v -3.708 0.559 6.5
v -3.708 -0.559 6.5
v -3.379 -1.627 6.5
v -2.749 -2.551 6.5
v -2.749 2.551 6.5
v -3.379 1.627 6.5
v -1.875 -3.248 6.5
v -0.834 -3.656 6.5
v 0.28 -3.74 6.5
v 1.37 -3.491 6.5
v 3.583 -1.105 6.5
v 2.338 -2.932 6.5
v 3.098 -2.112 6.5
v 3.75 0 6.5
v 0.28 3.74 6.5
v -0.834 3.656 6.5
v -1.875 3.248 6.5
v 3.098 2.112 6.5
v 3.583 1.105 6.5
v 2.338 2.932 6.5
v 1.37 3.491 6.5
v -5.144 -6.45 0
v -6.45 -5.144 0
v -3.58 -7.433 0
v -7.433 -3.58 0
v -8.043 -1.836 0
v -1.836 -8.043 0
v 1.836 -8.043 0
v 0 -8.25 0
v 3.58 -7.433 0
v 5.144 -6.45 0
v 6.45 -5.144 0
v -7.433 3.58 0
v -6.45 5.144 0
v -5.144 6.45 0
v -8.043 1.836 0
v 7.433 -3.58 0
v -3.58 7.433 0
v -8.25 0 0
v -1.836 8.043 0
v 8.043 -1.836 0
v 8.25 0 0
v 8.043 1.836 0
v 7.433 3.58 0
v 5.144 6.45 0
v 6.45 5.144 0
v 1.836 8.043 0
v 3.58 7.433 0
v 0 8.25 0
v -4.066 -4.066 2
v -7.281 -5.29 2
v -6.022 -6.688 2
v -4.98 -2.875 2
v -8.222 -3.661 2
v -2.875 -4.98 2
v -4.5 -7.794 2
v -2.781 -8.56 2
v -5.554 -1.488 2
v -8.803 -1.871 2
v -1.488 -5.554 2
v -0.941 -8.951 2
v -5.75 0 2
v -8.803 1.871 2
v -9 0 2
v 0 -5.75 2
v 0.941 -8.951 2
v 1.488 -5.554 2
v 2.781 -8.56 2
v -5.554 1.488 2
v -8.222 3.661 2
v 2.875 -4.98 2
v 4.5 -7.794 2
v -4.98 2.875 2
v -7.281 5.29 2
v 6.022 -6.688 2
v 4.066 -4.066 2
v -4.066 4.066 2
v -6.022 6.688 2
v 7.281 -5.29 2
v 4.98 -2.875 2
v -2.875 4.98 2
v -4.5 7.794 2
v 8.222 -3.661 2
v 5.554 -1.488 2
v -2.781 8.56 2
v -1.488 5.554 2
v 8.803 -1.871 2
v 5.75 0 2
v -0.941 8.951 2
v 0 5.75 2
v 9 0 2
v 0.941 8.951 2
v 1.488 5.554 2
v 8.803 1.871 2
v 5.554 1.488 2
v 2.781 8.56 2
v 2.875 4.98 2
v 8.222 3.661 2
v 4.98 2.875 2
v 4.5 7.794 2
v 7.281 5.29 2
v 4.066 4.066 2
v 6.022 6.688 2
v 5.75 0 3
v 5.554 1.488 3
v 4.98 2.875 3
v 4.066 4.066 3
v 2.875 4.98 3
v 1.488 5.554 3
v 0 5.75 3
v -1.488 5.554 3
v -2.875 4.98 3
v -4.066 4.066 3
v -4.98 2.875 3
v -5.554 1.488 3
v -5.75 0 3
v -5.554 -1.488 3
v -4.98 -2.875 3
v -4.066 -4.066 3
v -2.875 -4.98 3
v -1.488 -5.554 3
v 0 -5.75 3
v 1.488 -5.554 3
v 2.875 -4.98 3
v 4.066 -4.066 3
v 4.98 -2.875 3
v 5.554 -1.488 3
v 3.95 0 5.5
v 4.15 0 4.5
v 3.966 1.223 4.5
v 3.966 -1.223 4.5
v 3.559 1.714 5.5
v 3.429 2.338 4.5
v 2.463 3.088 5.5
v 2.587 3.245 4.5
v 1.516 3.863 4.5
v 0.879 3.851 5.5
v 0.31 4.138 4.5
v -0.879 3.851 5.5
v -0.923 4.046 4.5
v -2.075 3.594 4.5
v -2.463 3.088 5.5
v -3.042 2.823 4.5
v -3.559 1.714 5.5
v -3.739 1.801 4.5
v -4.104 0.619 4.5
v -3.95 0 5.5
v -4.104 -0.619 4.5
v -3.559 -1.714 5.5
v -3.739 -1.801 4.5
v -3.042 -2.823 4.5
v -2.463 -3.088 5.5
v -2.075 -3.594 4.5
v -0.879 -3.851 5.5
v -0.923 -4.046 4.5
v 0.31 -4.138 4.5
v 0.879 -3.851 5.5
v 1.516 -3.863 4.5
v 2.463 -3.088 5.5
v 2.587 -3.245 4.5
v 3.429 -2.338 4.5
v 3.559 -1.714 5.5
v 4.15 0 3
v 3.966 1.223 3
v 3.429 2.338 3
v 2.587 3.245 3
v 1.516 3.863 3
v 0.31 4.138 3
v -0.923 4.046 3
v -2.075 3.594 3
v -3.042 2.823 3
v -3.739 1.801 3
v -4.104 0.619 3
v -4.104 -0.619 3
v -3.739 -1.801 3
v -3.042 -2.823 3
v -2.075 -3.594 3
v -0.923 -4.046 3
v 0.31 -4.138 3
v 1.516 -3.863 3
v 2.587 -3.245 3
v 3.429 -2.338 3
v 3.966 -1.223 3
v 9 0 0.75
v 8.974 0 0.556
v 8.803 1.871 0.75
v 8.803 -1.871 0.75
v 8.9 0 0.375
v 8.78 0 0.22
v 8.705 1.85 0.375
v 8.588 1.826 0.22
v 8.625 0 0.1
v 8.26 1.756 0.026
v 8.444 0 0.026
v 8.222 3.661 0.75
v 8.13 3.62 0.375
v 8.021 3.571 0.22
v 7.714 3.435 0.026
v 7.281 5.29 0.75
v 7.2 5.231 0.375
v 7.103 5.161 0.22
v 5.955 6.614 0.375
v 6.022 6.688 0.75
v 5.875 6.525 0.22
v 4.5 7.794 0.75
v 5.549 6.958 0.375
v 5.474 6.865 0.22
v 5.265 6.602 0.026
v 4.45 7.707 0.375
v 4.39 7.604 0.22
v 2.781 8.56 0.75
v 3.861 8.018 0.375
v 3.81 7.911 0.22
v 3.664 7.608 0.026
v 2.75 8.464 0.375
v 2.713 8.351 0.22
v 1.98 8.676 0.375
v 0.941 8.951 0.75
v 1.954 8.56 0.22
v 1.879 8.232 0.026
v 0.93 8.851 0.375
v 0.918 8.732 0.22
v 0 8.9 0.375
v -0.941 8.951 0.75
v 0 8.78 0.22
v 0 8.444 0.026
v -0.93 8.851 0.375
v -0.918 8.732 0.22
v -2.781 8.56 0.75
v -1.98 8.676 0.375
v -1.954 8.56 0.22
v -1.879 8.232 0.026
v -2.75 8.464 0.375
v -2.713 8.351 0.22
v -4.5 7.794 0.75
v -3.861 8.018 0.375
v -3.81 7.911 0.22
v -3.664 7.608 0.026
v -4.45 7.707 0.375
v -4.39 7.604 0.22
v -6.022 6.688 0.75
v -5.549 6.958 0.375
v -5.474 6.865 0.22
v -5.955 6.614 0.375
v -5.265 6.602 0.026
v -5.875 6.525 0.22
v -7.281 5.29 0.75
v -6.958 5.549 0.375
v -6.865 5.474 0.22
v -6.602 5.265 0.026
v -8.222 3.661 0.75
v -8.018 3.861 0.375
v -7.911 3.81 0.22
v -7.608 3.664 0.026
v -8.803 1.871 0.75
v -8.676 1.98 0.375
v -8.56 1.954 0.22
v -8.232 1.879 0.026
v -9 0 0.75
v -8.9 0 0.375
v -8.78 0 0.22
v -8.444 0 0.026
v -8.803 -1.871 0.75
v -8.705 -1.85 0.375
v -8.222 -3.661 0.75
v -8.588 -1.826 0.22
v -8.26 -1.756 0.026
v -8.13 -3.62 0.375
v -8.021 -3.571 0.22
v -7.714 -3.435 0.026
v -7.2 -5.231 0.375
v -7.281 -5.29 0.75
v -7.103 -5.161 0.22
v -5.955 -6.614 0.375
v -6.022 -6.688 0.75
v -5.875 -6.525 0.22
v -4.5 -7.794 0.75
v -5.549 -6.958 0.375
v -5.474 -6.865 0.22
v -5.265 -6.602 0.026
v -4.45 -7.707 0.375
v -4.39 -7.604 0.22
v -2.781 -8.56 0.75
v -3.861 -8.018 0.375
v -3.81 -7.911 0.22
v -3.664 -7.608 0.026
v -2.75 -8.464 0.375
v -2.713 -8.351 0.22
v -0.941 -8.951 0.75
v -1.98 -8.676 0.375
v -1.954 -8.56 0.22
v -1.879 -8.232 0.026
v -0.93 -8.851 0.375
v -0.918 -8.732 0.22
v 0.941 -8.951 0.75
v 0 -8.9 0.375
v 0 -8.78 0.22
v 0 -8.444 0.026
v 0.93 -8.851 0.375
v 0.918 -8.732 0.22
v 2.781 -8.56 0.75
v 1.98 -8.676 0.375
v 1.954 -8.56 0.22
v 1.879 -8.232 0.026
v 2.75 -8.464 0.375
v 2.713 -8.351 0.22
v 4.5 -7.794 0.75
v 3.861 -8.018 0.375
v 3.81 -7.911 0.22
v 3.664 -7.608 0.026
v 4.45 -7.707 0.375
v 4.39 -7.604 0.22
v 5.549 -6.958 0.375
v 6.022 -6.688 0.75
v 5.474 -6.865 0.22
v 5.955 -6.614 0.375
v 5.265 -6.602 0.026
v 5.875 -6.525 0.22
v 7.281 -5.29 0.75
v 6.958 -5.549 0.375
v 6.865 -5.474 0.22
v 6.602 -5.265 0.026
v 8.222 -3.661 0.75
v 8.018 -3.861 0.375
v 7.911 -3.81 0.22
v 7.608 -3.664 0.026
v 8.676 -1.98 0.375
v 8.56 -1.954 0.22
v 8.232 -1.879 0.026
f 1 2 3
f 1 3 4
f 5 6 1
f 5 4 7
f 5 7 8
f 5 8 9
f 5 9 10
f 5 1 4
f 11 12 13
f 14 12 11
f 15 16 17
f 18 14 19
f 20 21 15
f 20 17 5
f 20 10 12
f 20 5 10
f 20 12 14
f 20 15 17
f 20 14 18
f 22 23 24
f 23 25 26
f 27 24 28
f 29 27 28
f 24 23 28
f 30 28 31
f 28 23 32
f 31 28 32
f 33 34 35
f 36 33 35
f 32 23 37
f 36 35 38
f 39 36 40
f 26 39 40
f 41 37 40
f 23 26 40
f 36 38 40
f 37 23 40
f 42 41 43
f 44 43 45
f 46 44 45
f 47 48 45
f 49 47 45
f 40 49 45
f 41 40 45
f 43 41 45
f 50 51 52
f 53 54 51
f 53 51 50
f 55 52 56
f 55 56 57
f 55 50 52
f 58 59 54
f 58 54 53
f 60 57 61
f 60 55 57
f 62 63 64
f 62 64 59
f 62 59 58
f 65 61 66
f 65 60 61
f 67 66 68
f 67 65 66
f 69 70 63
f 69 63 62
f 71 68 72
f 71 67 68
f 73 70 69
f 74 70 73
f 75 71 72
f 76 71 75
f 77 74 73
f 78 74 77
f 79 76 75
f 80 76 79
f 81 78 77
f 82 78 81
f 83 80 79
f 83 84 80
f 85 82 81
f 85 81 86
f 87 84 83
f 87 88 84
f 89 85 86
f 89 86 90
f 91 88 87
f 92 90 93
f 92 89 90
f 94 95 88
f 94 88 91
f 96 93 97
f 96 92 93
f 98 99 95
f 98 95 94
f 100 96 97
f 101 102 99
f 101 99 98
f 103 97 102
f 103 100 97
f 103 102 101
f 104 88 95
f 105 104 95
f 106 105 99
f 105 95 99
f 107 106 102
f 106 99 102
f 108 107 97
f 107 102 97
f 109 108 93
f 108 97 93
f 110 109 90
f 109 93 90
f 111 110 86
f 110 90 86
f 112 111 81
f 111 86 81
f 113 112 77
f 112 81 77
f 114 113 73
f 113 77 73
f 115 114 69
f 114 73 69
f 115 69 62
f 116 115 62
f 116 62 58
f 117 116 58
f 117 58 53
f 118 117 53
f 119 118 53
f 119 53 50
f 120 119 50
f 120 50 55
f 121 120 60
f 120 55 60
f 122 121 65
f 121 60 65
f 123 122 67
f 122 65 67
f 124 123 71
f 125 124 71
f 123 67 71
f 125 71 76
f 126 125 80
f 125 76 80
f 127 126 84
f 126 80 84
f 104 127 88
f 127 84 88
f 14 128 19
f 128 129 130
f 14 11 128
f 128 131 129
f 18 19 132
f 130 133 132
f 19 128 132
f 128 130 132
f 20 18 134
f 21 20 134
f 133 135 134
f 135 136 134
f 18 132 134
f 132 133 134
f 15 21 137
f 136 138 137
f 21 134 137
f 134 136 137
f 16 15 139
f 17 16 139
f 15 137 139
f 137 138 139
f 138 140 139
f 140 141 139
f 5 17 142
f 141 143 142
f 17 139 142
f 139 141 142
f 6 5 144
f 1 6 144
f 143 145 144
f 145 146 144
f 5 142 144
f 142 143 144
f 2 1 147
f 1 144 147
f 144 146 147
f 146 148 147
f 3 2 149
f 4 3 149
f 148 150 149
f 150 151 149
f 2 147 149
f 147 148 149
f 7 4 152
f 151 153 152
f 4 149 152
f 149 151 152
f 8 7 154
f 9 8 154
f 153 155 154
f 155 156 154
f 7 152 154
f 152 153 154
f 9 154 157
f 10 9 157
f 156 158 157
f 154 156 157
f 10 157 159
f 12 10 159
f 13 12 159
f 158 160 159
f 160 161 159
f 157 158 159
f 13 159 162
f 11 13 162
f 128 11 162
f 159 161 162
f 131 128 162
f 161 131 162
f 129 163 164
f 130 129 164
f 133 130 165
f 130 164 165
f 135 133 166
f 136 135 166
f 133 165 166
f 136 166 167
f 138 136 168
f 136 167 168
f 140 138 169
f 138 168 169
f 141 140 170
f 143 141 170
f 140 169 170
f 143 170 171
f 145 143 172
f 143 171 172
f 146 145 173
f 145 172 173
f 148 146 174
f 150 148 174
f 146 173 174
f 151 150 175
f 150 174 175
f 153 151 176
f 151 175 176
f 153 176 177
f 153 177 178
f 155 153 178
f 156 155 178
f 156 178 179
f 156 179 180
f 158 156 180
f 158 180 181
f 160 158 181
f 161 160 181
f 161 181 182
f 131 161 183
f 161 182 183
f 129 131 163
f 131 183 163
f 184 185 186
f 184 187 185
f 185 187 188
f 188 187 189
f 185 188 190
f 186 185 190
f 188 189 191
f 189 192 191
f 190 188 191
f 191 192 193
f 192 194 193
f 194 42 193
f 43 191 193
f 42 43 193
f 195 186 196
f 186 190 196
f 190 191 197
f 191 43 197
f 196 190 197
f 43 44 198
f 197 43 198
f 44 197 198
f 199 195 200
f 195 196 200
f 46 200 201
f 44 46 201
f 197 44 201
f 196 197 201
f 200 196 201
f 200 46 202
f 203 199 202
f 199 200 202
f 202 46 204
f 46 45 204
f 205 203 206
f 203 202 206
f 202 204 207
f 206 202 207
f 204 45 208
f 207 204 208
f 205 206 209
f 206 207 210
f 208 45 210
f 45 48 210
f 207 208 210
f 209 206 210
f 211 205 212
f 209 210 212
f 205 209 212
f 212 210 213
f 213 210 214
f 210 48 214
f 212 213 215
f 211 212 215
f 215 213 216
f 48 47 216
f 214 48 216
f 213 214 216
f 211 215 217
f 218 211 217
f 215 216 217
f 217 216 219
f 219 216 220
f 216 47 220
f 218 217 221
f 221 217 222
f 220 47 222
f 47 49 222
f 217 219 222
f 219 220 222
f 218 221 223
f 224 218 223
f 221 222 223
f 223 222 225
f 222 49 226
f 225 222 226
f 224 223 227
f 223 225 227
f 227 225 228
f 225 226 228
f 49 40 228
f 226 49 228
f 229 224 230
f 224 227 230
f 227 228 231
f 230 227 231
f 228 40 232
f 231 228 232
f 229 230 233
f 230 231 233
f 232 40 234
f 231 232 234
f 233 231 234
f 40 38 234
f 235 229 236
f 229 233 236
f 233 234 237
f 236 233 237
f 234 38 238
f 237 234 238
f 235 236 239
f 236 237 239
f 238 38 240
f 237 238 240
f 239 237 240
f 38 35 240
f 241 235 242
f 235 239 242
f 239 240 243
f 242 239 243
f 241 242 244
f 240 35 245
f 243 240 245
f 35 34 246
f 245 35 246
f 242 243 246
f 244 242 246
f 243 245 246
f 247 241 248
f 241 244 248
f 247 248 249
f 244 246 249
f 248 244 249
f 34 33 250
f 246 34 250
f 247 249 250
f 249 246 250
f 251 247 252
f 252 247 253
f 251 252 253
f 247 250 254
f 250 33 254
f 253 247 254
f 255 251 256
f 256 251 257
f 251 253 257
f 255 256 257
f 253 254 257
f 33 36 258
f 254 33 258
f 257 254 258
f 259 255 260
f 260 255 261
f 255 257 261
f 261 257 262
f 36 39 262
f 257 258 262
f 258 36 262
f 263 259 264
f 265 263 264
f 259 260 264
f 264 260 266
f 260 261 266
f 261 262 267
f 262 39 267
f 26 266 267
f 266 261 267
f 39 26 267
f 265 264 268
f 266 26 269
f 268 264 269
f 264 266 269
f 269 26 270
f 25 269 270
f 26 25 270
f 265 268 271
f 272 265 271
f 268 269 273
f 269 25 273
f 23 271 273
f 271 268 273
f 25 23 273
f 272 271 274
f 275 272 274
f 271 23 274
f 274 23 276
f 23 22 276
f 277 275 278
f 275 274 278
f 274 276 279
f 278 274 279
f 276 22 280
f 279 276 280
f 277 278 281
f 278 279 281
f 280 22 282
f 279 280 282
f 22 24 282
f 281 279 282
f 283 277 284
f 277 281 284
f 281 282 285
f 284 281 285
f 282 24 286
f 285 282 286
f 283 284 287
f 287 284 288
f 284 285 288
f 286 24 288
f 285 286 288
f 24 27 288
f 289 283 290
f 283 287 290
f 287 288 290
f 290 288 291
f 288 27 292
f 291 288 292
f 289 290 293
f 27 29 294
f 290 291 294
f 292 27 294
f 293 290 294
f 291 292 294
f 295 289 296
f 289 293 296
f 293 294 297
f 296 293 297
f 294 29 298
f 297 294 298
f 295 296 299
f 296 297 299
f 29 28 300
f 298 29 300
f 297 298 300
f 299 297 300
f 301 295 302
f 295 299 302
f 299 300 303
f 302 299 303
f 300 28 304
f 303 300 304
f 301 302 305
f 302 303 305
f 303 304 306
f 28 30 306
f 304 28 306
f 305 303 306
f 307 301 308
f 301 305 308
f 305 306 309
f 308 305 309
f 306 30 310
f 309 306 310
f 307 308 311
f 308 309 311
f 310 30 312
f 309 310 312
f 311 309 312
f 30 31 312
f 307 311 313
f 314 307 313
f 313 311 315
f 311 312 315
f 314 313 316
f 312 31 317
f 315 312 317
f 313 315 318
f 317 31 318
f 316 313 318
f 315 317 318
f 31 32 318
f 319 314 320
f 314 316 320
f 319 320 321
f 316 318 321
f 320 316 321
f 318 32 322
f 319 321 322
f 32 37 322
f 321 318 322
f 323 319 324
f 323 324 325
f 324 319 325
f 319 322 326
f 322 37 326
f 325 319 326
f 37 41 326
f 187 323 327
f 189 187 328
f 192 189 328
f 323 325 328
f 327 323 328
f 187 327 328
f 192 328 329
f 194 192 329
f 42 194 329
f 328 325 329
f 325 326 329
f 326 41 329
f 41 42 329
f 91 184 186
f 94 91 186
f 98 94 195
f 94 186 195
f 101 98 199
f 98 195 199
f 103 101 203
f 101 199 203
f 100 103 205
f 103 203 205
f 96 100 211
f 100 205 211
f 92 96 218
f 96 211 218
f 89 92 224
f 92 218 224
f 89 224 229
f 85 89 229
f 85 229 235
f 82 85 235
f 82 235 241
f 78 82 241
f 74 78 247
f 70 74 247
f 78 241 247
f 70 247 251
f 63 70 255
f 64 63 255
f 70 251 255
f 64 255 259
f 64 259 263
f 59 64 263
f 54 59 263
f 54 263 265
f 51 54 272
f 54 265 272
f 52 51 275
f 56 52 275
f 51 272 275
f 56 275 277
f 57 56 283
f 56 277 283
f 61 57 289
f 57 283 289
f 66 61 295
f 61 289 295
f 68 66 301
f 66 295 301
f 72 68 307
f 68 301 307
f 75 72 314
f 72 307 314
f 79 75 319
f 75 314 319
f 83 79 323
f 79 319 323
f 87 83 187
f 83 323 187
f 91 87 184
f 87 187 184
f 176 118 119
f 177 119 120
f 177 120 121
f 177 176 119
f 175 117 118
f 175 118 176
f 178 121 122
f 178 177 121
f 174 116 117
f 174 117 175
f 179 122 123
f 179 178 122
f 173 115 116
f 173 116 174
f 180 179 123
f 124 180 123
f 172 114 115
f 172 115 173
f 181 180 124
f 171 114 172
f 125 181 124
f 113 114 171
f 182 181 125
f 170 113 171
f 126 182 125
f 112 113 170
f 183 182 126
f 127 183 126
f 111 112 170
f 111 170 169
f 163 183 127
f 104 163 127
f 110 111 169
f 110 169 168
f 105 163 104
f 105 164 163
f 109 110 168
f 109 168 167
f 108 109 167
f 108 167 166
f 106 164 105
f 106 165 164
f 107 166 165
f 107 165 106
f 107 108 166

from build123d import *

# Parameters (mm, degrees)
F0_R     = 9
F1_DEPTH = 2
F2_R     = 5.75
F3_DEPTH = 1
F4_R     = 4.15
F5_DEPTH = 3.5
F6_R     = 0.75
F7_SIZE2 = 2
F7_SIZE  = 0.4


with BuildPart() as f1:
    # F0 (on Top) → F1 (new body)
    with BuildSketch(Plane.XY):
        Circle(F0_R)
    extrude(amount=F1_DEPTH)

    # F2 (on face) → F3 (join)
    with BuildSketch(Plane.XY.offset(2)):
        Circle(F2_R)
    extrude(amount=F3_DEPTH)

    # F4 (on face) → F5 (join)
    with BuildSketch(Plane.XY.offset(3)):
        Circle(F4_R)
    extrude(amount=F5_DEPTH)

    # F6
    f6_edges = [f1.edges().sort_by_distance(p)[0] for p in [
        (-9, 0, 0),
    ]]
    fillet(f6_edges, radius=F6_R)

    # F7
    f7_edges = [f1.edges().sort_by_distance(p)[0] for p in [
        (-4.15, 0, 6.5),
    ]]
    f7_side = f1.faces().sort_by_distance((0, 0, 6.5))[0]
    chamfer(f7_edges, length=F7_SIZE, length2=F7_SIZE2, reference=f7_side)


solid = f1.part
